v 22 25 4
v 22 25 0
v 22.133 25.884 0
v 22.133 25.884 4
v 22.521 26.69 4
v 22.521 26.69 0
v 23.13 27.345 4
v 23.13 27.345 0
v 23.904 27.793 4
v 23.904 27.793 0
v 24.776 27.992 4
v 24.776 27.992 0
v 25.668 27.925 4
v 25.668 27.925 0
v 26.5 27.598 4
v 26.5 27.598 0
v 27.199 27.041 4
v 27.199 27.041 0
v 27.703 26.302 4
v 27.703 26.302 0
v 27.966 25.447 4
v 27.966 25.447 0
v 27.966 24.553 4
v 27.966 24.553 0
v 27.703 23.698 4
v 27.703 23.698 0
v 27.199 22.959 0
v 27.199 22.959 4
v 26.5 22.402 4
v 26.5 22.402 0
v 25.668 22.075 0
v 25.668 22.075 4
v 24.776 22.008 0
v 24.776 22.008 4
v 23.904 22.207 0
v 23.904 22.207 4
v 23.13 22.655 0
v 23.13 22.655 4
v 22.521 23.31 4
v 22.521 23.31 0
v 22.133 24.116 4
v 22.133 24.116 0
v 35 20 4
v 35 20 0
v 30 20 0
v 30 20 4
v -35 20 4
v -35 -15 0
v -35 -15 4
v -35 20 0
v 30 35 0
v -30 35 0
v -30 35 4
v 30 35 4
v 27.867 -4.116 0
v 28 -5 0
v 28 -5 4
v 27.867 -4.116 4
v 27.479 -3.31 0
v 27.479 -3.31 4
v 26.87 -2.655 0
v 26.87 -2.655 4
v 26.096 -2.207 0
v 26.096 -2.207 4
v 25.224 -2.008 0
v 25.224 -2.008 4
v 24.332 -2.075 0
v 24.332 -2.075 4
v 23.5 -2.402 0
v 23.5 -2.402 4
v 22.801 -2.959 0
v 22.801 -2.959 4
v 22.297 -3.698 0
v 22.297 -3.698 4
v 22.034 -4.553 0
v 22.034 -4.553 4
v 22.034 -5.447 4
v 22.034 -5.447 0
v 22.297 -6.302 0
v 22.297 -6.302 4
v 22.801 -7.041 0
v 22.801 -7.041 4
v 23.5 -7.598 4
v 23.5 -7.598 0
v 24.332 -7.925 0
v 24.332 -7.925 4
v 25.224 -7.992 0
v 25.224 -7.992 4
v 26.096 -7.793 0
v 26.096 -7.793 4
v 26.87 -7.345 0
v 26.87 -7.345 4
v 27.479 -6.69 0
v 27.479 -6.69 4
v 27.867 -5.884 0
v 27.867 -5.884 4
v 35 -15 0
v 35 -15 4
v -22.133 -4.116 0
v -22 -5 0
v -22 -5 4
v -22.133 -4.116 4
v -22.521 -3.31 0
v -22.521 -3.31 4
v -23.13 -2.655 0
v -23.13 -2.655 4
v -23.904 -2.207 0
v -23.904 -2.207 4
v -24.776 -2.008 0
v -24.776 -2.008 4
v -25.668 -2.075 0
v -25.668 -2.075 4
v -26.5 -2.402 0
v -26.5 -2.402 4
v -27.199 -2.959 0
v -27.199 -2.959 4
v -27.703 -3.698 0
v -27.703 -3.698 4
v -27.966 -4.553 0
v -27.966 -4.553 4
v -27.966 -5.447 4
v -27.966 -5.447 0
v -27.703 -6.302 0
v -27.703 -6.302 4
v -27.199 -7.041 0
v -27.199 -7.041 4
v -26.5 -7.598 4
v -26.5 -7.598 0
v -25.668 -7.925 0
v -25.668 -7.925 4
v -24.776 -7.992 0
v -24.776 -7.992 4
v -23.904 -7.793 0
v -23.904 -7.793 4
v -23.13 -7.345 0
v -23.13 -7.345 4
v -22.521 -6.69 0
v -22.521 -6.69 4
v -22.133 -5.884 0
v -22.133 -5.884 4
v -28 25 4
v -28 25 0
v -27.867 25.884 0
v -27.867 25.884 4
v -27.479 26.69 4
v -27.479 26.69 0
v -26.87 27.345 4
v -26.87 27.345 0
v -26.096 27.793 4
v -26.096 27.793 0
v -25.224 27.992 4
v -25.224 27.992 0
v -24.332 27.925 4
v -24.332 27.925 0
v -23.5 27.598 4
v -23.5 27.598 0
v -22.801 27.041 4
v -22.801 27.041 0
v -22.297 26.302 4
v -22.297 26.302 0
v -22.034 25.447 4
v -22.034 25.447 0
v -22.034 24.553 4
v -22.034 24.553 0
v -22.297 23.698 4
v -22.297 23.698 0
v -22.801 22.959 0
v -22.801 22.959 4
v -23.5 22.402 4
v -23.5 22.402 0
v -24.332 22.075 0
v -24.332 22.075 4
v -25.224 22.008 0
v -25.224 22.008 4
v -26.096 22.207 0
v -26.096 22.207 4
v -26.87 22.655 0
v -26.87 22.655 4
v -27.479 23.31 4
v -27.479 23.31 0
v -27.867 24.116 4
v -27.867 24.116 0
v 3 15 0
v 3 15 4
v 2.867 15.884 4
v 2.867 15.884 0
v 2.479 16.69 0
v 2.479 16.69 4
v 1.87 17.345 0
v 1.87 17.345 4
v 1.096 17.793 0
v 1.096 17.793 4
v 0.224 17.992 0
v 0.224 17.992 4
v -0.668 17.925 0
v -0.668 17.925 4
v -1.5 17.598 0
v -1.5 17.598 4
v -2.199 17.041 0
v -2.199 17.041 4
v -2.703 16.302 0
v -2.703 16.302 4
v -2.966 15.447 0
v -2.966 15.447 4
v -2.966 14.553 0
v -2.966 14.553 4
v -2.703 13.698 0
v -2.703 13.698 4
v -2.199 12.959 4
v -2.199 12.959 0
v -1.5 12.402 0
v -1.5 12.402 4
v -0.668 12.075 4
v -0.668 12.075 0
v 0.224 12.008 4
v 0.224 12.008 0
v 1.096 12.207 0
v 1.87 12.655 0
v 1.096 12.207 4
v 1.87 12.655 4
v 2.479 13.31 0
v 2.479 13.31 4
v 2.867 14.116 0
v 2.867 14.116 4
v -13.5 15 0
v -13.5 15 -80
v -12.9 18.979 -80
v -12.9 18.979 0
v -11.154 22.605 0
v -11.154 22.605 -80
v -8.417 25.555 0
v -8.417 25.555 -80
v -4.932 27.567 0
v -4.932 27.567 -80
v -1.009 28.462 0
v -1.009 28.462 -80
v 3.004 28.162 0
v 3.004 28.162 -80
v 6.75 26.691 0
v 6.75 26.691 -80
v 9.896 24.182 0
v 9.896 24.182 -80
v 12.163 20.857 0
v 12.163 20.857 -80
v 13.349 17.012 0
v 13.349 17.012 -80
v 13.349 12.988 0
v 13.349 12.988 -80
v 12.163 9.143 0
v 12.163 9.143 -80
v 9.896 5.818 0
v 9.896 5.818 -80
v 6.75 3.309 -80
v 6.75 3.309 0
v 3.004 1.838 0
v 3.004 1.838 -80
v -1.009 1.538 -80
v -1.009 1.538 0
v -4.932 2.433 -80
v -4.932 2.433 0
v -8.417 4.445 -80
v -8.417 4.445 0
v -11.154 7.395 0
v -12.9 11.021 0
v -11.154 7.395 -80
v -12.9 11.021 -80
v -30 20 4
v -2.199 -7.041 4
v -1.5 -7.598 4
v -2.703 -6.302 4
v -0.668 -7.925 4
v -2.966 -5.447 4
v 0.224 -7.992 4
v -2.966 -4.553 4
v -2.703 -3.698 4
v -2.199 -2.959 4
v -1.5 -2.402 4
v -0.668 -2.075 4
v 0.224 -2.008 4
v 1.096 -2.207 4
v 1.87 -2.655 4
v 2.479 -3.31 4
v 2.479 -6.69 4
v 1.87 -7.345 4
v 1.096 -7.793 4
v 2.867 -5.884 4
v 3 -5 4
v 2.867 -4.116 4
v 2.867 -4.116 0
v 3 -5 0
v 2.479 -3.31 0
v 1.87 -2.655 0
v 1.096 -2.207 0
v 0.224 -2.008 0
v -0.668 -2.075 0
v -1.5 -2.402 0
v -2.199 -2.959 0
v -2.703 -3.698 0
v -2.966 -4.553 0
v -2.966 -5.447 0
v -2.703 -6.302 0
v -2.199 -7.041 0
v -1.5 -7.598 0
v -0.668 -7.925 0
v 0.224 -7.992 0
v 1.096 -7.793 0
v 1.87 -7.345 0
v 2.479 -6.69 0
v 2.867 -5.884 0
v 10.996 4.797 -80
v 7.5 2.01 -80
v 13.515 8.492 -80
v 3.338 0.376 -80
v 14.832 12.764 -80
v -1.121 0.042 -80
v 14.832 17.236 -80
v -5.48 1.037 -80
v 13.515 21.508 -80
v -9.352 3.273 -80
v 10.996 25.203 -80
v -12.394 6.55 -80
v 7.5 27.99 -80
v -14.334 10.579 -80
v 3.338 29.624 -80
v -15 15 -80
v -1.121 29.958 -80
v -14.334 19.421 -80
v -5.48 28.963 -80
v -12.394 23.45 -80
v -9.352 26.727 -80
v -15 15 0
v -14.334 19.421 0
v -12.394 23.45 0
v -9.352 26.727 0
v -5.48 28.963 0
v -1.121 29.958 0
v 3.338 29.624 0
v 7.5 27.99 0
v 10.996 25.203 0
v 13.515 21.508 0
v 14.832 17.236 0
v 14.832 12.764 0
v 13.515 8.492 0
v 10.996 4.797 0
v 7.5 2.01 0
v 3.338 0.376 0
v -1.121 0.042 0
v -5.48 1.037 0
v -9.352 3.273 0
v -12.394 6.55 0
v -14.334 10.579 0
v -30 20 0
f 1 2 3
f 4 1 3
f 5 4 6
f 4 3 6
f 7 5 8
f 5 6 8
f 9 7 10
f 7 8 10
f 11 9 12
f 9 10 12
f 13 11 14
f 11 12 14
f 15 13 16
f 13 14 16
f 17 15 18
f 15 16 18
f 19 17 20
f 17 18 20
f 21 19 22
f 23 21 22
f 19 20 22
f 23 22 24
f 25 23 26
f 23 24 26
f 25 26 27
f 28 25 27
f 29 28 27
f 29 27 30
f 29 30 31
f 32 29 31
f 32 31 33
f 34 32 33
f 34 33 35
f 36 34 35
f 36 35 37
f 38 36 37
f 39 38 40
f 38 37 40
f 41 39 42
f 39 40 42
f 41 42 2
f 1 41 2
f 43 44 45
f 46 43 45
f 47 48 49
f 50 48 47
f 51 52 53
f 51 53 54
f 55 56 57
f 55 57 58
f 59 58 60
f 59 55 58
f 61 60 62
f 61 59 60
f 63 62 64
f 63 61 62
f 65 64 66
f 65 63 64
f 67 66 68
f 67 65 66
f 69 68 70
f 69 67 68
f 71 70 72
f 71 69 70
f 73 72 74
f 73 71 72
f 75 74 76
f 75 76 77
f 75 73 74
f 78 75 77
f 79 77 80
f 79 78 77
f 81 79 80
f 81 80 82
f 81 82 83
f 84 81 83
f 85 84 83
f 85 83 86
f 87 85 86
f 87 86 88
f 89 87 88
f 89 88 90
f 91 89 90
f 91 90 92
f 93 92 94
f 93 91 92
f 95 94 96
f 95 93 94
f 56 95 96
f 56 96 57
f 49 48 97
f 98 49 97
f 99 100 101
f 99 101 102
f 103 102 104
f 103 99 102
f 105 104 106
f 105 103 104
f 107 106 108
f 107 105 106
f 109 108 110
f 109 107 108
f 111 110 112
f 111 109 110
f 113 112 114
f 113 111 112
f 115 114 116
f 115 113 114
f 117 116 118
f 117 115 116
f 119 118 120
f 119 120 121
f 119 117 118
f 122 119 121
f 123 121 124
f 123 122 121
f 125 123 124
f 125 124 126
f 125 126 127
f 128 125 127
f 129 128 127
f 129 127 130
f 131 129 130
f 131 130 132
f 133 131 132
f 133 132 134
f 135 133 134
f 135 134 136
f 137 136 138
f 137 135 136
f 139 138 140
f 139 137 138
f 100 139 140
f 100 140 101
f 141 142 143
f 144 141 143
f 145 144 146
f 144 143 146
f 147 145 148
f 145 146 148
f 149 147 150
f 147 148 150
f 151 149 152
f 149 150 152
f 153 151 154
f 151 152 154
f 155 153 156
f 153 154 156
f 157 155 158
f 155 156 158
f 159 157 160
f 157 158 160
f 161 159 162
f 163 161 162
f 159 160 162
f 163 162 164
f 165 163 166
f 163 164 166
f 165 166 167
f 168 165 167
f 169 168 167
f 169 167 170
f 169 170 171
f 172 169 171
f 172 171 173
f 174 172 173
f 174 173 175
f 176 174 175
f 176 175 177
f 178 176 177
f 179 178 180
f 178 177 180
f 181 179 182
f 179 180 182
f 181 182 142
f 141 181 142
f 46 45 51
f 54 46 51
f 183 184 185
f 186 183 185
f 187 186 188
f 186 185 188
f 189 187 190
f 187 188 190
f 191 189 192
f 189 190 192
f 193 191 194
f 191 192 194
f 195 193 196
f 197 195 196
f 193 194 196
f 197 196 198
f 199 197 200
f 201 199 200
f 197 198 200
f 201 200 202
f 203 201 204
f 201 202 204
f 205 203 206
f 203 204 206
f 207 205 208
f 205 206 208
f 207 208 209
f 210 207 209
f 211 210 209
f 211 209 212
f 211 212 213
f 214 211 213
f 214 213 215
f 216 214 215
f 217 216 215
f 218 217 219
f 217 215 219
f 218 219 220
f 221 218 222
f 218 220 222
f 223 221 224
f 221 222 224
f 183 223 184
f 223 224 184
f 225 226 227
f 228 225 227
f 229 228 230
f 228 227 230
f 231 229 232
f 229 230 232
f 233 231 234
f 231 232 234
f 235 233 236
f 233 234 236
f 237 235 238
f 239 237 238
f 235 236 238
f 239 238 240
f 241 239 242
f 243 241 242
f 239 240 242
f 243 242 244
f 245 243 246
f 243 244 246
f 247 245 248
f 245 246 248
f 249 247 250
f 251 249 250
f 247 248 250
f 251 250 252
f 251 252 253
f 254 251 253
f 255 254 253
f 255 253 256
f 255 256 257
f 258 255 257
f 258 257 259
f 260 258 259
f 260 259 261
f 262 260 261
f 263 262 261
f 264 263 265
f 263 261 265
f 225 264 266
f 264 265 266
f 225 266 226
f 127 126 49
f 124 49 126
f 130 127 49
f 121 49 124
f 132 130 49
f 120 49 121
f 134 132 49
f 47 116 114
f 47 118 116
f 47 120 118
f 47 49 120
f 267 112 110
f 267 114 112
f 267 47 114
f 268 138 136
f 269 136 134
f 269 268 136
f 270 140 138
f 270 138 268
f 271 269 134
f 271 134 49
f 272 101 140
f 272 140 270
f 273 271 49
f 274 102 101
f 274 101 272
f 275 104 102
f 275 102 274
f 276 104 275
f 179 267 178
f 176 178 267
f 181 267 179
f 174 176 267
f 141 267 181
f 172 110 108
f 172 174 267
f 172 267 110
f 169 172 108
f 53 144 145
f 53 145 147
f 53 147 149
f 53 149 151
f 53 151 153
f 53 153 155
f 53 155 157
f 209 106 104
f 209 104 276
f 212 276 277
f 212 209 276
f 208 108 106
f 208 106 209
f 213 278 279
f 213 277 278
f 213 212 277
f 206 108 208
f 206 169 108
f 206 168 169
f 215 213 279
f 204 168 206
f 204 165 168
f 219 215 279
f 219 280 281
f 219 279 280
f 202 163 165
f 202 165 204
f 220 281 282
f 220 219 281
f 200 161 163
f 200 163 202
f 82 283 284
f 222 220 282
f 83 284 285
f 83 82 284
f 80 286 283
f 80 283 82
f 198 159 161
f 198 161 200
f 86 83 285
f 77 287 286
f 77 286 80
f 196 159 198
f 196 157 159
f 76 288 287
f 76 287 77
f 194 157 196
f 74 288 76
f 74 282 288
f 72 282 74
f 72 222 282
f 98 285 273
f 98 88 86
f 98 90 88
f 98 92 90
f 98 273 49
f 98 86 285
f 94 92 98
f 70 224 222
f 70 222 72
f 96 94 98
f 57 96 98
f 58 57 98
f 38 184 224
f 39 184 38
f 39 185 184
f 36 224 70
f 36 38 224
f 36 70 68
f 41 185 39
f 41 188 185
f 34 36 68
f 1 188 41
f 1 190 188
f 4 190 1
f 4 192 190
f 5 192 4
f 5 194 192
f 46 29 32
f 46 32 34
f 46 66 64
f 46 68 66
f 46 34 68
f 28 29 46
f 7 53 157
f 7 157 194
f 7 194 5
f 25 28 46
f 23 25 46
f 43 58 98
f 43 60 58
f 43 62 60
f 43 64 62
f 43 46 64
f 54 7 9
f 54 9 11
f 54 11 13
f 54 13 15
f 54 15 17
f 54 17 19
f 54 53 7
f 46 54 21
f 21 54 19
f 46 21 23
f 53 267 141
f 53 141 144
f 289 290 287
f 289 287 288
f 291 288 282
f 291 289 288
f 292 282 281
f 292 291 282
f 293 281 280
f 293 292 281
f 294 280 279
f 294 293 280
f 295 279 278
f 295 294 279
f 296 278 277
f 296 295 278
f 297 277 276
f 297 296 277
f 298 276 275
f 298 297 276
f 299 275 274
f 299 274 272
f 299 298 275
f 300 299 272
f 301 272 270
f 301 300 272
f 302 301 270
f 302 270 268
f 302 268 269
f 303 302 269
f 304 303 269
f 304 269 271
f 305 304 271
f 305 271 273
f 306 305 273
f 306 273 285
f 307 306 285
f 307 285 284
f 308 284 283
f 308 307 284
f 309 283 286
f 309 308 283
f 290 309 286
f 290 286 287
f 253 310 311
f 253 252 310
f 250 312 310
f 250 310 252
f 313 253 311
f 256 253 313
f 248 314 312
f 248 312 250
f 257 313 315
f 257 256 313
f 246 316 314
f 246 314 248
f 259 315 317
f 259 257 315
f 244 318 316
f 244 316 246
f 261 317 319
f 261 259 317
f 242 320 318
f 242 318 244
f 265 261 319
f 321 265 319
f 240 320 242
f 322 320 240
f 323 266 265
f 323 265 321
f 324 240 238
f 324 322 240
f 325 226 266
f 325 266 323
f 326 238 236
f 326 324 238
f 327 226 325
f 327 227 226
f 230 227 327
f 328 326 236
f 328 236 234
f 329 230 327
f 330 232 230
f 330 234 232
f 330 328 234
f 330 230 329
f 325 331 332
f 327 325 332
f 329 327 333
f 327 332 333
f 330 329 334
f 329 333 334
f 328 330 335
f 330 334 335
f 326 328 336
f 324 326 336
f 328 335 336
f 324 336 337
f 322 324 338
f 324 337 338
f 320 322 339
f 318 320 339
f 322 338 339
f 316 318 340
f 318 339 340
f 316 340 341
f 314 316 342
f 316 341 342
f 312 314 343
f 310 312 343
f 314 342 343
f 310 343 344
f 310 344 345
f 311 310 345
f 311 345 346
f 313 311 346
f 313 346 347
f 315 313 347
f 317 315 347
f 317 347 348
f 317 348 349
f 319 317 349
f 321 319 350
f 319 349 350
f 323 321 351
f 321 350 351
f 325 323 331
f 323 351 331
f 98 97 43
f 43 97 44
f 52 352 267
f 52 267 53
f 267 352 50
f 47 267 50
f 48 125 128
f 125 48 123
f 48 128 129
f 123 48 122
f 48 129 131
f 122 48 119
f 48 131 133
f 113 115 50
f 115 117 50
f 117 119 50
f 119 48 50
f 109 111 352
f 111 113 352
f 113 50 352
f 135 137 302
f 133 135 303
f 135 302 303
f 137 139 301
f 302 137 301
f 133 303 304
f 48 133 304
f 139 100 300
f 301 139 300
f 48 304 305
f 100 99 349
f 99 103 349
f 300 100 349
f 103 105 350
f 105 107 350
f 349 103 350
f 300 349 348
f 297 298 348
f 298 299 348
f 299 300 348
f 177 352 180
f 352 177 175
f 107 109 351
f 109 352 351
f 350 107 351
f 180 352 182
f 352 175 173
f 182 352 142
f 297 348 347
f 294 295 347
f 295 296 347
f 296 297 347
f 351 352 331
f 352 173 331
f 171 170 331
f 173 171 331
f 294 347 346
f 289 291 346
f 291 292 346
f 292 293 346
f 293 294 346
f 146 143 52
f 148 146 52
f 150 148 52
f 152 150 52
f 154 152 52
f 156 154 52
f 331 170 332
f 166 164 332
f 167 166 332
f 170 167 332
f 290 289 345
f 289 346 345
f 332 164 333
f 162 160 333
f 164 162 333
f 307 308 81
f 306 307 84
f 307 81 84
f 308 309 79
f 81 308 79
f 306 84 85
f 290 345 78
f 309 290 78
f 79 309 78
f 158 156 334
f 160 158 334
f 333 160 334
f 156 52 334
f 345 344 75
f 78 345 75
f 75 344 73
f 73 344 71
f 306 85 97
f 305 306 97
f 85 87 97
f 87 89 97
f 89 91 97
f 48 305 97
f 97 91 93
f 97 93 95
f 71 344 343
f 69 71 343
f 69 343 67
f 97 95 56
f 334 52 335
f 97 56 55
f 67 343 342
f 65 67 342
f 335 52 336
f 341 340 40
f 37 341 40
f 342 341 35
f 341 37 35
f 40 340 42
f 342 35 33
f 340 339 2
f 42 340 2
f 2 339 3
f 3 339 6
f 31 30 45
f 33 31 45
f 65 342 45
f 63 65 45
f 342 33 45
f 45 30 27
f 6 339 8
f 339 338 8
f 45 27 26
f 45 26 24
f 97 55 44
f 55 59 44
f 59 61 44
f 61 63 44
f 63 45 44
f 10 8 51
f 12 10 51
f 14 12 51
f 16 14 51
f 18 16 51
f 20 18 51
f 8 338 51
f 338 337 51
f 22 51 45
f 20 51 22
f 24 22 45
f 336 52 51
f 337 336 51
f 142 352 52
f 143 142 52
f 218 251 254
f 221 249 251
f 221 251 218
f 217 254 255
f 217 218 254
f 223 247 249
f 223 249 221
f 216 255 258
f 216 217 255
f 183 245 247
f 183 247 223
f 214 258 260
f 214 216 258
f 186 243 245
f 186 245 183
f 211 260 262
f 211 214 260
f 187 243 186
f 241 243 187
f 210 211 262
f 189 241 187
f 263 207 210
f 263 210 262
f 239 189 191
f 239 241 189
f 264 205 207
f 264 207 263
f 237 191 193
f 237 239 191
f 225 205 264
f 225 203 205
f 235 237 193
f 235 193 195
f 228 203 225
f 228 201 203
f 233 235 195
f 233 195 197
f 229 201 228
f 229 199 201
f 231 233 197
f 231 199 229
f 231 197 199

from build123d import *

# Parameters (mm, degrees)
CROQUIS1_W              = 70
CROQUIS1_H              = 30
CROQUIS1_R              = 3
SALIENTE_EXTRUIR1_DEPTH = 4
CROQUIS3_W              = 70
CROQUIS3_H              = 20
SALIENTE_EXTRUIR2_DEPTH = 4
CROQUIS4_R              = 15
SALIENTE_EXTRUIR3_DEPTH = 80
CROQUIS5_R              = 3
CORTAR_EXTRUIR1_DEPTH   = 4
CROQUIS7_R              = 13.5
CORTAR_EXTRUIR2_DEPTH   = 80
CROQUIS6_R              = 3
CORTAR_EXTRUIR3_DEPTH   = 4
CROQUIS8_W              = 5
CROQUIS8_H              = 15
CORTAR_EXTRUIR4_DEPTH   = 4


with BuildPart() as part:
    # Croquis1 → Saliente-Extruir1 (new body)
    with BuildSketch(Plane.XY):
        Rectangle(CROQUIS1_W, CROQUIS1_H)
        with Locations((0, -5)):
            Circle(CROQUIS1_R, mode=Mode.SUBTRACT)
        with Locations((25, -5)):
            Circle(CROQUIS1_R, mode=Mode.SUBTRACT)
        with Locations((-25, -5)):
            Circle(CROQUIS1_R, mode=Mode.SUBTRACT)
    extrude(amount=SALIENTE_EXTRUIR1_DEPTH)

    # Croquis3 → Saliente-Extruir2 (add)
    with BuildSketch(Plane.XY):
        with Locations((0, 25)):
            Rectangle(CROQUIS3_W, CROQUIS3_H)
    extrude(amount=SALIENTE_EXTRUIR2_DEPTH)

    # Croquis4 → Saliente-Extruir3 (add)
    with BuildSketch(Plane(origin=(0, 0, 0), x_dir=(-1, 0, 0), z_dir=(0, 0, -1))):
        with Locations((0, 15)):
            Circle(CROQUIS4_R)
    extrude(amount=SALIENTE_EXTRUIR3_DEPTH)

    # Croquis5 → Cortar-Extruir1 (cut)
    with BuildSketch(Plane(origin=(0, 0, 0), x_dir=(-1, 0, 0), z_dir=(0, 0, -1))):
        with Locations((-25, 25)):
            Circle(CROQUIS5_R)
        with Locations((25, 25)):
            Circle(CROQUIS5_R)
    extrude(amount=-CORTAR_EXTRUIR1_DEPTH, mode=Mode.SUBTRACT)

    # Croquis7 → Cortar-Extruir2 (cut)
    with BuildSketch(Plane(origin=(0, 0, -80), x_dir=(-1, 0, 0), z_dir=(0, 0, -1))):
        with Locations((0, 15)):
            Circle(CROQUIS7_R)
    extrude(amount=-CORTAR_EXTRUIR2_DEPTH, mode=Mode.SUBTRACT)

    # Croquis6 → Cortar-Extruir3 (cut)
    with BuildSketch(Plane.XY.offset(4)):
        with Locations((0, 15)):
            Circle(CROQUIS6_R)
    extrude(amount=-CORTAR_EXTRUIR3_DEPTH, mode=Mode.SUBTRACT)

    # Croquis8 → Cortar-Extruir4 (cut)
    with BuildSketch(Plane(origin=(0, 0, 0), x_dir=(-1, 0, 0), z_dir=(0, 0, -1))):
        with Locations((-32.5, 27.5)):
            Rectangle(CROQUIS8_W, CROQUIS8_H)
        with Locations((32.5, 27.5)):
            Rectangle(CROQUIS8_W, CROQUIS8_H)
    extrude(amount=-CORTAR_EXTRUIR4_DEPTH, mode=Mode.SUBTRACT)


solid = part.part
